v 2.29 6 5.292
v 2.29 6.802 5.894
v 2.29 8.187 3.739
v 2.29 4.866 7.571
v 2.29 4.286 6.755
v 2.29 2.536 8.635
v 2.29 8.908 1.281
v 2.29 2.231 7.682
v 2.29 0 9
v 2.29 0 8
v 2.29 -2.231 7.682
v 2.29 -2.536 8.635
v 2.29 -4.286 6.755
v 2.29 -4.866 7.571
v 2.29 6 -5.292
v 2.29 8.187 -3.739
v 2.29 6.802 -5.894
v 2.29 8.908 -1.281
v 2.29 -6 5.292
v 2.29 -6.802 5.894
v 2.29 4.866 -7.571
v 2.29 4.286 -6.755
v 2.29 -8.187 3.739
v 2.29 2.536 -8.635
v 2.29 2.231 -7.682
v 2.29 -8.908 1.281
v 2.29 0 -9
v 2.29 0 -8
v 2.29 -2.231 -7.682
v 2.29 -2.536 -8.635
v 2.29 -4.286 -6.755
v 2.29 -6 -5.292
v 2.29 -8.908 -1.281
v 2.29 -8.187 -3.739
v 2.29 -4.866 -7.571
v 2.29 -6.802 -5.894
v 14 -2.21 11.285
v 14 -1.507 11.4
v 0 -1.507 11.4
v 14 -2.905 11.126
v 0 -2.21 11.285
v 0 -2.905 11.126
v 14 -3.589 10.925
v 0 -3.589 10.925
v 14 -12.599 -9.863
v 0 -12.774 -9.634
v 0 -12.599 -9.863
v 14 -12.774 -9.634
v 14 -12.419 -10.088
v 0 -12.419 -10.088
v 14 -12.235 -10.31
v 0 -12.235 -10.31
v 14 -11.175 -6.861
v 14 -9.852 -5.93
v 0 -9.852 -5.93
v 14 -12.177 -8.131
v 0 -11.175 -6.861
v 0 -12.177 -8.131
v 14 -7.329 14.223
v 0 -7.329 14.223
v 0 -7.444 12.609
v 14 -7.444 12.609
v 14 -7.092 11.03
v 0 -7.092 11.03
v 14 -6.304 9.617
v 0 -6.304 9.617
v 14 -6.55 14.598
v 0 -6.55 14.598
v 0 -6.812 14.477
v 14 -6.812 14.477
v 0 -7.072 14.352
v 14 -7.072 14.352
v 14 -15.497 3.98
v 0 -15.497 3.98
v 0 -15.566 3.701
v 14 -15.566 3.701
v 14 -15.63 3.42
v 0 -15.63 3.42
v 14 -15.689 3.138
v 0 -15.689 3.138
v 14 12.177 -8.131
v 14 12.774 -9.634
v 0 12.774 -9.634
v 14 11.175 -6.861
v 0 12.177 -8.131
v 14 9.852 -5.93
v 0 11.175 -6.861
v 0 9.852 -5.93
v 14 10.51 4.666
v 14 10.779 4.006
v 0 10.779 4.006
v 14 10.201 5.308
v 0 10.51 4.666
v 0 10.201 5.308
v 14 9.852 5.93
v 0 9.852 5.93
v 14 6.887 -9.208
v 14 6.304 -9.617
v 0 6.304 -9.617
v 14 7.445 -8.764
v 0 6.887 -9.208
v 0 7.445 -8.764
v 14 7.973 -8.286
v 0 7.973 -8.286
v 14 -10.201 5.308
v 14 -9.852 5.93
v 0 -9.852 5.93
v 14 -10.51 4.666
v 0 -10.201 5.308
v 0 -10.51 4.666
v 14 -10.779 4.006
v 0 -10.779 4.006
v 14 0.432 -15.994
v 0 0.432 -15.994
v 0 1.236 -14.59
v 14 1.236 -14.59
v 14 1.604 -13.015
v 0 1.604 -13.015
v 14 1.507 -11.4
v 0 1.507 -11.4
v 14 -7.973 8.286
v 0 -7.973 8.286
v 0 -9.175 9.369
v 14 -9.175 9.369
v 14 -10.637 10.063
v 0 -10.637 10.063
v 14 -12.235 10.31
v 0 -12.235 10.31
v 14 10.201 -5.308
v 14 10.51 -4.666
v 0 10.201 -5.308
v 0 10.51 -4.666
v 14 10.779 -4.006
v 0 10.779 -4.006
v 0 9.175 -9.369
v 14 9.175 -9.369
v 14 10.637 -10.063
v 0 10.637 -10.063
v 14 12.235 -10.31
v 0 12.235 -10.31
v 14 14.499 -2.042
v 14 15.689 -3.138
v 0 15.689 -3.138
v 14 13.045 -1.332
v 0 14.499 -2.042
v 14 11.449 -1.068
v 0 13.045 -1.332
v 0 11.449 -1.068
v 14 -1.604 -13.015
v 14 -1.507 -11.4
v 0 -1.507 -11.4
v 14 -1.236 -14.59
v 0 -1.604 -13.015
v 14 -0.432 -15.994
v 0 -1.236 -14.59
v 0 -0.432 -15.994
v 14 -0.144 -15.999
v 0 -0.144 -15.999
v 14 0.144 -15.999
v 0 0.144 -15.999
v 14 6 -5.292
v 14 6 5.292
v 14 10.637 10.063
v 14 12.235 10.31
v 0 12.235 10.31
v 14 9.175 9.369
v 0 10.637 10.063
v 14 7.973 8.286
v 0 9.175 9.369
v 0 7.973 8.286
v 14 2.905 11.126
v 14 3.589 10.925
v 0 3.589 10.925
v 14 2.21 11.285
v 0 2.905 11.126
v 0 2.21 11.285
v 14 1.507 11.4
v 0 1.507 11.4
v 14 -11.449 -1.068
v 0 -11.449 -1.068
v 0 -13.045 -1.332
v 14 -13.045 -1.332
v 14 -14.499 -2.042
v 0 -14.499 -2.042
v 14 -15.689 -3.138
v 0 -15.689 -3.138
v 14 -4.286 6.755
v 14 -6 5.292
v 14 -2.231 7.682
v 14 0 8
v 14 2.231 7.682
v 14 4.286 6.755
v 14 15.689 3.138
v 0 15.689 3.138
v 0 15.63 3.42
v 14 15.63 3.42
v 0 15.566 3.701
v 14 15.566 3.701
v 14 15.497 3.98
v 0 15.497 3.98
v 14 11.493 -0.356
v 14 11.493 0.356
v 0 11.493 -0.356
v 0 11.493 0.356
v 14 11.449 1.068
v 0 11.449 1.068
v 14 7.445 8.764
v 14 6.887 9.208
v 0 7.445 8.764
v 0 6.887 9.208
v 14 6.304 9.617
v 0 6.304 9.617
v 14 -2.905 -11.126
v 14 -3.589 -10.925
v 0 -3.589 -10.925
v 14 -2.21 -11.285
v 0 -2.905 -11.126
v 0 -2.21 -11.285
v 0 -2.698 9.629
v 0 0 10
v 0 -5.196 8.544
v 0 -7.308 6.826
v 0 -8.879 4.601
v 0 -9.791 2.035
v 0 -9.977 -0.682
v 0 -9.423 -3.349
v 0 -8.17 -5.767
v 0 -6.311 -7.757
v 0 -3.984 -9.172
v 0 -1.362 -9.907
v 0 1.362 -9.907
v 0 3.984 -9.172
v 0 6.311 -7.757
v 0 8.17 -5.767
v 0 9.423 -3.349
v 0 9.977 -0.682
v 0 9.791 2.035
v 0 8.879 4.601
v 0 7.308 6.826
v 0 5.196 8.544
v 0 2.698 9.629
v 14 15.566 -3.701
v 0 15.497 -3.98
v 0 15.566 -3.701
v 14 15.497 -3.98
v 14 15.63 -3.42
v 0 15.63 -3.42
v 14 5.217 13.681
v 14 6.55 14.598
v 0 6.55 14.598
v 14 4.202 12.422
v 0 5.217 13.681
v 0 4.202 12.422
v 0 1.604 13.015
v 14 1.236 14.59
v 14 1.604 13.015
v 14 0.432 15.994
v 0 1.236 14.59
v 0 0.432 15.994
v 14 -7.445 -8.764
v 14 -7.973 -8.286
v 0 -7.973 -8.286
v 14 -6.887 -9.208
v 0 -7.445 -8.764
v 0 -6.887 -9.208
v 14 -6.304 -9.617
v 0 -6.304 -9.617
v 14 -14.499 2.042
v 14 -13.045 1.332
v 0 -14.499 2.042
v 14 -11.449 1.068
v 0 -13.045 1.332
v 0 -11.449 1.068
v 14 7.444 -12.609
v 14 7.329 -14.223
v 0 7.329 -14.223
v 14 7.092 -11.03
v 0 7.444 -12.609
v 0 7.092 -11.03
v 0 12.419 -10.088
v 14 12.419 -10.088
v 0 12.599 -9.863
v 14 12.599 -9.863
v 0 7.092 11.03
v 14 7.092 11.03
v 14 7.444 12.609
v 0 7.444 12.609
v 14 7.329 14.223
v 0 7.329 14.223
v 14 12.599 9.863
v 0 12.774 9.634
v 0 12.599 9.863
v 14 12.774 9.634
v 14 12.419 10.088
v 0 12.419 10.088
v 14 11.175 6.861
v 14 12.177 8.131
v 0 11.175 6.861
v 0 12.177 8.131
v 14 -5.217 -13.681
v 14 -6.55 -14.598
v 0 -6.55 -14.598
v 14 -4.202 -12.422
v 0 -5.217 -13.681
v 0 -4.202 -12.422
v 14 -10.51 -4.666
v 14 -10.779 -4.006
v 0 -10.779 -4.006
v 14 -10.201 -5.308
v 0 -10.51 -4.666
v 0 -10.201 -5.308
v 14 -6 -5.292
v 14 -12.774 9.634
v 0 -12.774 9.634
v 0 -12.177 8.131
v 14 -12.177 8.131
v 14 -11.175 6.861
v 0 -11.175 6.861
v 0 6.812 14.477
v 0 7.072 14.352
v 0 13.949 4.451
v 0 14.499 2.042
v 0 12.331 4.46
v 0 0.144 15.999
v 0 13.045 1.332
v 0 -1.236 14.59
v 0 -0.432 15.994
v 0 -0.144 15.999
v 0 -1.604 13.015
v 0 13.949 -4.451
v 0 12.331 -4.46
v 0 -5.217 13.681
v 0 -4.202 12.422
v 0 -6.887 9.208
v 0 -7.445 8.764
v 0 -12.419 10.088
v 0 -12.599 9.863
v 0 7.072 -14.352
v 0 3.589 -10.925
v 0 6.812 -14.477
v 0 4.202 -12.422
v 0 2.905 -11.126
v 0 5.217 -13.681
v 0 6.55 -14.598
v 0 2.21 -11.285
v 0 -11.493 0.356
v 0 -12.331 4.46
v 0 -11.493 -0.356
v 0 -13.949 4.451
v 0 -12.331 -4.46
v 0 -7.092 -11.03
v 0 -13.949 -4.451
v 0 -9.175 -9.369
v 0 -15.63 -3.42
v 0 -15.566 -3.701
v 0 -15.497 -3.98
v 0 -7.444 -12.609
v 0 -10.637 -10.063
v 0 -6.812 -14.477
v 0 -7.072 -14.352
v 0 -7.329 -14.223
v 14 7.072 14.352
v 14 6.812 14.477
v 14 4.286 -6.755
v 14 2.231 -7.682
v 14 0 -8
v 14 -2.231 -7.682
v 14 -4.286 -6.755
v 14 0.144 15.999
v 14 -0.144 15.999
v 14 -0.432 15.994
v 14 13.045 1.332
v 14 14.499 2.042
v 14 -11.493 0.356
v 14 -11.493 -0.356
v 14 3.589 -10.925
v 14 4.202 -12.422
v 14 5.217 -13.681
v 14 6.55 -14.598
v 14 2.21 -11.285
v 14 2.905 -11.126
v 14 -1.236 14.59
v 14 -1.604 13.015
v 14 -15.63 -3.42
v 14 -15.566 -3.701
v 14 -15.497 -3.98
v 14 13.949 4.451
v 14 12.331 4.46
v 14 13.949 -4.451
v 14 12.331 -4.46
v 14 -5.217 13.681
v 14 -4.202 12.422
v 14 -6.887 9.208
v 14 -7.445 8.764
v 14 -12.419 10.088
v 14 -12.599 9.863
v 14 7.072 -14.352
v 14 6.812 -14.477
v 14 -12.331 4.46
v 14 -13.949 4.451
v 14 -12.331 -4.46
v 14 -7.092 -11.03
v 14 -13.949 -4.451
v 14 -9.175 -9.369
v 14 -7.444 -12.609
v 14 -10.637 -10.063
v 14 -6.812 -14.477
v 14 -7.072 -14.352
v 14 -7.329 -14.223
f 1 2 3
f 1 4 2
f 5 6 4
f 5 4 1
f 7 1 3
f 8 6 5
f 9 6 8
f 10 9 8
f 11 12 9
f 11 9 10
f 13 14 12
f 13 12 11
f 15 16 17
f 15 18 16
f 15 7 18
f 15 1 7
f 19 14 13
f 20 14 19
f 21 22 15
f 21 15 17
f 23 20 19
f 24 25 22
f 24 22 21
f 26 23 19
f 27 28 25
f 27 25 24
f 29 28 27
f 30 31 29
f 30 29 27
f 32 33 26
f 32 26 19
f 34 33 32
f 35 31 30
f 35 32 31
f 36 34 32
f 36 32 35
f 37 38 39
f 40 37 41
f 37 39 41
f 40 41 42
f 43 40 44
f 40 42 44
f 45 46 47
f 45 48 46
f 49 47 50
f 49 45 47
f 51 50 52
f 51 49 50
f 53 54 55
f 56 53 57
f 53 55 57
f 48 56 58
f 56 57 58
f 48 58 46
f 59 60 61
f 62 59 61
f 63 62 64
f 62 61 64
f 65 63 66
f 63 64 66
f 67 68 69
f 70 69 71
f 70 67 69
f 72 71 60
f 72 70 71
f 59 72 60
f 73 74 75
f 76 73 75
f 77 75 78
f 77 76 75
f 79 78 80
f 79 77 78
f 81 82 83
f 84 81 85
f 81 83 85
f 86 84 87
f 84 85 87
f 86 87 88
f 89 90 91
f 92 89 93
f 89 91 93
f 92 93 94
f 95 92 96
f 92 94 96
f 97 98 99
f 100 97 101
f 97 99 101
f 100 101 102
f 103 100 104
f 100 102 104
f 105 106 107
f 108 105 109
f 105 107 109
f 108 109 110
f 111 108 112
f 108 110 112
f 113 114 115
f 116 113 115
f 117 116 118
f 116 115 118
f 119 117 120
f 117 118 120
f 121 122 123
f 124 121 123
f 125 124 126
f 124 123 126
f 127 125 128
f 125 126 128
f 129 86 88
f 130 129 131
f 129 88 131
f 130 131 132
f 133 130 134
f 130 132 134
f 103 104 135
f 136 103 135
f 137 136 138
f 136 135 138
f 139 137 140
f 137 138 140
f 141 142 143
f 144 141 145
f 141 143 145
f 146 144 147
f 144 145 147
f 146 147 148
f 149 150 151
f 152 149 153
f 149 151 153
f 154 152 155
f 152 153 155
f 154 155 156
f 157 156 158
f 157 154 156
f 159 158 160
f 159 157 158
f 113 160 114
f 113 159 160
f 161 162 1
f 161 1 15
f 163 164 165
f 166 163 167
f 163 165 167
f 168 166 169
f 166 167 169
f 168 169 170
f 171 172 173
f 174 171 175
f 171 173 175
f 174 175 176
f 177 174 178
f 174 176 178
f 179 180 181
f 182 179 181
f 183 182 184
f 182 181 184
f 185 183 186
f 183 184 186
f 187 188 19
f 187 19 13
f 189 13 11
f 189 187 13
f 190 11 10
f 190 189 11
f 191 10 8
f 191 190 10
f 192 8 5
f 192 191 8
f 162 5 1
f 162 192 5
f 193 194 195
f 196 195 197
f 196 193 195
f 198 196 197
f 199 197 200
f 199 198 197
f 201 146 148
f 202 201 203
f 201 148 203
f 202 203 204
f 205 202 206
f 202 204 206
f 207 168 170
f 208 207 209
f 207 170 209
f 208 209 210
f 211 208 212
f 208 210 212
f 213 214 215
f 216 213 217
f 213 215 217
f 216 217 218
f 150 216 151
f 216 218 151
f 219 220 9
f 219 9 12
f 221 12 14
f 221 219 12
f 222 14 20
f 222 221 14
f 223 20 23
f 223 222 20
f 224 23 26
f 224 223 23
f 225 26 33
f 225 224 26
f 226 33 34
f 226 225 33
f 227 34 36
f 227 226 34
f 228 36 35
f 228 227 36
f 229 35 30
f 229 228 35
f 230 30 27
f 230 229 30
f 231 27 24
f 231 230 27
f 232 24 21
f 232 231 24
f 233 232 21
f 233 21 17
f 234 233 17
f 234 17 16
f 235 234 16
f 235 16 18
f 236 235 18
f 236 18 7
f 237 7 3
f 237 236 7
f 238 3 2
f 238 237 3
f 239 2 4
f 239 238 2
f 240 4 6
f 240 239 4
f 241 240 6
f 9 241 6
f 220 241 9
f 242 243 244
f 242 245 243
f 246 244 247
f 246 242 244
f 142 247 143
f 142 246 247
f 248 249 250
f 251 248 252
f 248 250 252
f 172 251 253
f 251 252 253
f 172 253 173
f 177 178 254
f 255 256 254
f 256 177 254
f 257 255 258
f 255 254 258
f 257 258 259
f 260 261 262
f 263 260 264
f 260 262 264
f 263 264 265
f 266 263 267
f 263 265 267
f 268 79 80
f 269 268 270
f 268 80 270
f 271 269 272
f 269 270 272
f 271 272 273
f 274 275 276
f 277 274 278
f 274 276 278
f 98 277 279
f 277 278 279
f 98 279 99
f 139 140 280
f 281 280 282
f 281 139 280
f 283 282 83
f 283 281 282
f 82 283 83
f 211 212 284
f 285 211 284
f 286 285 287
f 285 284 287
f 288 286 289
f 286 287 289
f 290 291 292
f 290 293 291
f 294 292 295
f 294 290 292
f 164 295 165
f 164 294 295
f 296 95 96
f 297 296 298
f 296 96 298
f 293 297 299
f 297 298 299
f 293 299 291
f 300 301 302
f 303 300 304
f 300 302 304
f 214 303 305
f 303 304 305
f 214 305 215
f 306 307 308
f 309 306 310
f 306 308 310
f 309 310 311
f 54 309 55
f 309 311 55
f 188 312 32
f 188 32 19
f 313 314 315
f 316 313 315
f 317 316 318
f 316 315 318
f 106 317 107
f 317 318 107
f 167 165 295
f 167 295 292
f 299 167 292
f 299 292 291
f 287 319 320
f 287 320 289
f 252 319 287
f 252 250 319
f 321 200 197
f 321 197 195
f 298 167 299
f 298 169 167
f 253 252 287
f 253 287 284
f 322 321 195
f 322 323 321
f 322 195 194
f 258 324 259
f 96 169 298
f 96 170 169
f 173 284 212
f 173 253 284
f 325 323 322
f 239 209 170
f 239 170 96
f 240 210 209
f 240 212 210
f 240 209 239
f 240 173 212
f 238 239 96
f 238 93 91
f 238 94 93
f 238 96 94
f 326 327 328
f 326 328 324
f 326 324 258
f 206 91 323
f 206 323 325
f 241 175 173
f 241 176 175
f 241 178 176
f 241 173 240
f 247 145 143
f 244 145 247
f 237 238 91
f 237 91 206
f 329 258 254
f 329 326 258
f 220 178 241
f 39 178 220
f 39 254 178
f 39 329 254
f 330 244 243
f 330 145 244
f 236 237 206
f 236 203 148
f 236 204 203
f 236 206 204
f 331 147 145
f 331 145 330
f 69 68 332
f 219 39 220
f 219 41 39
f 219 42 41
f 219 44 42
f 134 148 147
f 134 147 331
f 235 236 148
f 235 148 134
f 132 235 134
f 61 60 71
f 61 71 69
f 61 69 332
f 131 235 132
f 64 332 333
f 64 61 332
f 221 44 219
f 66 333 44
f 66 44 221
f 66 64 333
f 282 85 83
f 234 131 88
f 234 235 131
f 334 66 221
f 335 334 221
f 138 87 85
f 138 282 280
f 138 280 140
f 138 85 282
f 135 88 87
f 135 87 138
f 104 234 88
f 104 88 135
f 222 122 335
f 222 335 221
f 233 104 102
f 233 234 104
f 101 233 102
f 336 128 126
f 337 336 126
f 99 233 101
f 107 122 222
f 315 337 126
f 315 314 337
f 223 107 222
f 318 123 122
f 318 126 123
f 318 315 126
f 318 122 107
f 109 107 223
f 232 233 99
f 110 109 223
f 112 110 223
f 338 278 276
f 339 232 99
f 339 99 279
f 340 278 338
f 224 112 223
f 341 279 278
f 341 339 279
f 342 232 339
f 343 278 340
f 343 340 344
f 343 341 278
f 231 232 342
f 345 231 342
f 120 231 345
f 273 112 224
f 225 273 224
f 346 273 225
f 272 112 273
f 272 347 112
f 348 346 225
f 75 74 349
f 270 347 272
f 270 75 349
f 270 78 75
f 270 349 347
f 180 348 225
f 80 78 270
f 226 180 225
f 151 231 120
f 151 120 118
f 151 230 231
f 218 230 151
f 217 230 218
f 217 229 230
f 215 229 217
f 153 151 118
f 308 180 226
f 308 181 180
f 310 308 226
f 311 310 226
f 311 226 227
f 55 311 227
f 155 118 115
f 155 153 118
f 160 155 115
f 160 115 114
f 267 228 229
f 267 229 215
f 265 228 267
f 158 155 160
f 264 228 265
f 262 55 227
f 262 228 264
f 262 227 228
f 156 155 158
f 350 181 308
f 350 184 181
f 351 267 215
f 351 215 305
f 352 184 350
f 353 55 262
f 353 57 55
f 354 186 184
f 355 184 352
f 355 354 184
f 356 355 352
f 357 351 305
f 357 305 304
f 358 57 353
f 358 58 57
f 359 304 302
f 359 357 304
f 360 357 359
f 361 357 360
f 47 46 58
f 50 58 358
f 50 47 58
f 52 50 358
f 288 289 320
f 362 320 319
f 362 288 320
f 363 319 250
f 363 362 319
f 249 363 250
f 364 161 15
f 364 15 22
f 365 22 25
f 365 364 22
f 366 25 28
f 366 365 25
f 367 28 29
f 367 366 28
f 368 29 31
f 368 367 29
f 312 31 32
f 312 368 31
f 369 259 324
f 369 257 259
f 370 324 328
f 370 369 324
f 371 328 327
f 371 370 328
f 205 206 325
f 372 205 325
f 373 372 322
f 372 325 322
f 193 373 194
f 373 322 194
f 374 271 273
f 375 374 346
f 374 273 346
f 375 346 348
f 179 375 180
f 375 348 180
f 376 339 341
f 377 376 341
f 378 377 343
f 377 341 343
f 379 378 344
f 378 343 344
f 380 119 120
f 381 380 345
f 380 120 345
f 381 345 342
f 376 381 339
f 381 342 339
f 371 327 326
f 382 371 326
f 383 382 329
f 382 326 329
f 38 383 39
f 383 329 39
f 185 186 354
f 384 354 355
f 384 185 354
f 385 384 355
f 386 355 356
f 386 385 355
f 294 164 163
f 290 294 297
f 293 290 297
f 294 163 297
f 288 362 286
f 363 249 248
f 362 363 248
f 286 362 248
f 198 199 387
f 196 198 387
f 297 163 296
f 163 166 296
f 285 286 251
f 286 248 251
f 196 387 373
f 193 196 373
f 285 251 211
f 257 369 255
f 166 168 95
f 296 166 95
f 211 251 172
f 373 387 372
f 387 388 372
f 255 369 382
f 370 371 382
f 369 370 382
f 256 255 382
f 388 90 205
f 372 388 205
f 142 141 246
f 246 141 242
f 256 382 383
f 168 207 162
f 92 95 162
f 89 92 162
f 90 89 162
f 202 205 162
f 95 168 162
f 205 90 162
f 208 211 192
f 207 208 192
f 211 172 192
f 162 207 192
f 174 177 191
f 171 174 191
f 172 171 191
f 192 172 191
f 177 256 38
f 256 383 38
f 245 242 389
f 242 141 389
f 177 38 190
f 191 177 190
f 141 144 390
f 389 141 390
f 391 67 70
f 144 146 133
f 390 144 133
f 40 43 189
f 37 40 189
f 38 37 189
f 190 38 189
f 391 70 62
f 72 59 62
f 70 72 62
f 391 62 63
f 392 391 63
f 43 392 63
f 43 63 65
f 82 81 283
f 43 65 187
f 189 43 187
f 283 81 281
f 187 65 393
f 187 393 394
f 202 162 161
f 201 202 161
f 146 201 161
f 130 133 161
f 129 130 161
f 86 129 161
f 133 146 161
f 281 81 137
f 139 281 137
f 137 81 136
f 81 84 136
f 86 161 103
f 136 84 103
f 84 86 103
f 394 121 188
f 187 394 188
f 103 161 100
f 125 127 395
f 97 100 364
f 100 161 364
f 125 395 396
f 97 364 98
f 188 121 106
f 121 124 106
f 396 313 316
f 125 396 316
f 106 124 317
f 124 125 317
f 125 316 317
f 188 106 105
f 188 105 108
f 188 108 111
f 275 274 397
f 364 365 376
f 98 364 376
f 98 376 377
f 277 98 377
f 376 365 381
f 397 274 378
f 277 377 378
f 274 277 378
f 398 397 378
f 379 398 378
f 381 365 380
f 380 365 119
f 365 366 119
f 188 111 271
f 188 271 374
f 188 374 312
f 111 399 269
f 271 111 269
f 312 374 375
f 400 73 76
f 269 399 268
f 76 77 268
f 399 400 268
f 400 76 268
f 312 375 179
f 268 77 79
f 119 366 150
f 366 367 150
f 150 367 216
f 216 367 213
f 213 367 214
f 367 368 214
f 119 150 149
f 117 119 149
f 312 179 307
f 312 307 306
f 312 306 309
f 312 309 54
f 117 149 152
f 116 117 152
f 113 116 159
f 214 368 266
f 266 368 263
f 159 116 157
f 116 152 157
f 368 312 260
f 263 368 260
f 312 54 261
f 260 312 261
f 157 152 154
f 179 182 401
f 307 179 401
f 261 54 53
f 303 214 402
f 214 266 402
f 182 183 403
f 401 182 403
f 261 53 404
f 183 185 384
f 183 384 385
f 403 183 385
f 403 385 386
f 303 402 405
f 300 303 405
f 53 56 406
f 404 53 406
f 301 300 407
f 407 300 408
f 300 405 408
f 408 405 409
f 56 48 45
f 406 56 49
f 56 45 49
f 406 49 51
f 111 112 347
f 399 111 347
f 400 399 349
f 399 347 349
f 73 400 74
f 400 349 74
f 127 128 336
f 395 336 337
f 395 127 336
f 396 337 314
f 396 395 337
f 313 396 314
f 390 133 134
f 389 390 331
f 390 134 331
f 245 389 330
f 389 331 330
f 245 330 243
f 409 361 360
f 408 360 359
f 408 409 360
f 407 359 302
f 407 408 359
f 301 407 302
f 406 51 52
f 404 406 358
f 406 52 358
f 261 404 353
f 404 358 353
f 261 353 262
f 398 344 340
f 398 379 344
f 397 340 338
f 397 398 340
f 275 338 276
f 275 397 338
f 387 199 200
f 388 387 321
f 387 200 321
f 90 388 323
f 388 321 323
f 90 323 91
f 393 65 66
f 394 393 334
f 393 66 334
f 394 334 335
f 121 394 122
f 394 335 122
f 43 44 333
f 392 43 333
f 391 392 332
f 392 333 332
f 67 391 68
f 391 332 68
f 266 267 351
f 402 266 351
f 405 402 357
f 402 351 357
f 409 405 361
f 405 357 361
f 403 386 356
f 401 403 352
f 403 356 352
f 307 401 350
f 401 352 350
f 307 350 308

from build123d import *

# Parameters (mm, degrees)
BASPROSKE_W        = 14
BASPROSKE_H        = 16
TOOTHCUT_DEPTH     = 27.608269391
TEETHCUTS_COUNT    = 14
TEETHCUTS_ANGLE    = 334.285714286
BORSKE_R           = 0.4
BORE_DEPTH         = 50.0000508
CUT_EXTRUDE1_DEPTH = 27.422624507


with BuildPart() as part:
    # BasProSke → Base-Revolve (revolve)
    with BuildSketch(Plane(origin=(0, 0, 0), x_dir=(1, 0, 0), z_dir=(0, 1, 0)), mode=Mode.PRIVATE) as base_revolve_sk:
        with Locations((7, 8)):
            Rectangle(BASPROSKE_W, BASPROSKE_H)
    revolve(base_revolve_sk.sketch.rotate(Axis((-10, 0, 0), (1, 0, 0)), 180), axis=Axis((-10, 0, 0), (1, 0, 0)))

    # TooCutSke → ToothCut (cut, through all)
    with BuildSketch(Plane(origin=(0, 0, 0), x_dir=(0, 0, -1), z_dir=(1, 0, 0))):
        with BuildLine():
            ThreePointArc((1.067858192, 11.449309144), (0, 11.499), (-1.067858192, 11.449309144))
            ThreePointArc((-1.067858192, 11.449309144), (-1.641684211, 13.812780716), (-3.163375005, 15.710076503))
            ThreePointArc((-3.163375005, 15.710076503), (0, 16.0254), (3.163375005, 15.710076503))
            ThreePointArc((3.163375005, 15.710076503), (1.641684211, 13.812780716), (1.067858192, 11.449309144))
        make_face()
    toothcut = extrude(amount=TOOTHCUT_DEPTH, mode=Mode.SUBTRACT)

    # TeethCuts: ToothCut ×14 about axis
    teethcuts_axis = Axis((-10, 0, 0), (1, 0, 0))
    for i in range(1, TEETHCUTS_COUNT):
        add(toothcut.rotate(teethcuts_axis, i * TEETHCUTS_ANGLE / (TEETHCUTS_COUNT - 1)), mode=Mode.SUBTRACT)

    # BorSke → Bore (cut, symmetric)
    with BuildSketch(Plane(origin=(0, 0, 0), x_dir=(0, 0, -1), z_dir=(1, 0, 0))):
        with Locations(Location((0, 0, 0), (0, 0, 180))):
            Circle(BORSKE_R)
    extrude(amount=BORE_DEPTH, both=True, mode=Mode.SUBTRACT)

    # Sketch1 → Cut-Extrude1 (cut, through all)
    with BuildSketch(Plane(origin=(14, 0, 0), x_dir=(0, 0, -1), z_dir=(1, 0, 0))):
        with BuildLine():
            Line((-5.291502622, 6), (5.291502622, 6))
            ThreePointArc((5.291502622, 6), (8, 0), (5.291502622, -6))
            Line((5.291502622, -6), (-5.291502622, -6))
            ThreePointArc((-5.291502622, -6), (-8, 0), (-5.291502622, 6))
        make_face()
    extrude(amount=-CUT_EXTRUDE1_DEPTH, mode=Mode.SUBTRACT)

    # Sketch3 → Cut-Revolve2 (revolve, cut)
    with BuildSketch(Plane(origin=(0, 0, 0), x_dir=(1, 0, 0), z_dir=(0, 1, 0)), mode=Mode.PRIVATE) as cut_revolve2_sk:
        Polygon((0, 0), (2.289763839, 0), (2.289763839, 9), (-2.541437219, 11.109912375), (-2.541437219, 0), align=None)
    revolve(cut_revolve2_sk.sketch.rotate(Axis((-21.436119779, 0, 0), (1, 0, 0)), 180), axis=Axis((-21.436119779, 0, 0), (1, 0, 0)), mode=Mode.SUBTRACT)


solid = part.part
